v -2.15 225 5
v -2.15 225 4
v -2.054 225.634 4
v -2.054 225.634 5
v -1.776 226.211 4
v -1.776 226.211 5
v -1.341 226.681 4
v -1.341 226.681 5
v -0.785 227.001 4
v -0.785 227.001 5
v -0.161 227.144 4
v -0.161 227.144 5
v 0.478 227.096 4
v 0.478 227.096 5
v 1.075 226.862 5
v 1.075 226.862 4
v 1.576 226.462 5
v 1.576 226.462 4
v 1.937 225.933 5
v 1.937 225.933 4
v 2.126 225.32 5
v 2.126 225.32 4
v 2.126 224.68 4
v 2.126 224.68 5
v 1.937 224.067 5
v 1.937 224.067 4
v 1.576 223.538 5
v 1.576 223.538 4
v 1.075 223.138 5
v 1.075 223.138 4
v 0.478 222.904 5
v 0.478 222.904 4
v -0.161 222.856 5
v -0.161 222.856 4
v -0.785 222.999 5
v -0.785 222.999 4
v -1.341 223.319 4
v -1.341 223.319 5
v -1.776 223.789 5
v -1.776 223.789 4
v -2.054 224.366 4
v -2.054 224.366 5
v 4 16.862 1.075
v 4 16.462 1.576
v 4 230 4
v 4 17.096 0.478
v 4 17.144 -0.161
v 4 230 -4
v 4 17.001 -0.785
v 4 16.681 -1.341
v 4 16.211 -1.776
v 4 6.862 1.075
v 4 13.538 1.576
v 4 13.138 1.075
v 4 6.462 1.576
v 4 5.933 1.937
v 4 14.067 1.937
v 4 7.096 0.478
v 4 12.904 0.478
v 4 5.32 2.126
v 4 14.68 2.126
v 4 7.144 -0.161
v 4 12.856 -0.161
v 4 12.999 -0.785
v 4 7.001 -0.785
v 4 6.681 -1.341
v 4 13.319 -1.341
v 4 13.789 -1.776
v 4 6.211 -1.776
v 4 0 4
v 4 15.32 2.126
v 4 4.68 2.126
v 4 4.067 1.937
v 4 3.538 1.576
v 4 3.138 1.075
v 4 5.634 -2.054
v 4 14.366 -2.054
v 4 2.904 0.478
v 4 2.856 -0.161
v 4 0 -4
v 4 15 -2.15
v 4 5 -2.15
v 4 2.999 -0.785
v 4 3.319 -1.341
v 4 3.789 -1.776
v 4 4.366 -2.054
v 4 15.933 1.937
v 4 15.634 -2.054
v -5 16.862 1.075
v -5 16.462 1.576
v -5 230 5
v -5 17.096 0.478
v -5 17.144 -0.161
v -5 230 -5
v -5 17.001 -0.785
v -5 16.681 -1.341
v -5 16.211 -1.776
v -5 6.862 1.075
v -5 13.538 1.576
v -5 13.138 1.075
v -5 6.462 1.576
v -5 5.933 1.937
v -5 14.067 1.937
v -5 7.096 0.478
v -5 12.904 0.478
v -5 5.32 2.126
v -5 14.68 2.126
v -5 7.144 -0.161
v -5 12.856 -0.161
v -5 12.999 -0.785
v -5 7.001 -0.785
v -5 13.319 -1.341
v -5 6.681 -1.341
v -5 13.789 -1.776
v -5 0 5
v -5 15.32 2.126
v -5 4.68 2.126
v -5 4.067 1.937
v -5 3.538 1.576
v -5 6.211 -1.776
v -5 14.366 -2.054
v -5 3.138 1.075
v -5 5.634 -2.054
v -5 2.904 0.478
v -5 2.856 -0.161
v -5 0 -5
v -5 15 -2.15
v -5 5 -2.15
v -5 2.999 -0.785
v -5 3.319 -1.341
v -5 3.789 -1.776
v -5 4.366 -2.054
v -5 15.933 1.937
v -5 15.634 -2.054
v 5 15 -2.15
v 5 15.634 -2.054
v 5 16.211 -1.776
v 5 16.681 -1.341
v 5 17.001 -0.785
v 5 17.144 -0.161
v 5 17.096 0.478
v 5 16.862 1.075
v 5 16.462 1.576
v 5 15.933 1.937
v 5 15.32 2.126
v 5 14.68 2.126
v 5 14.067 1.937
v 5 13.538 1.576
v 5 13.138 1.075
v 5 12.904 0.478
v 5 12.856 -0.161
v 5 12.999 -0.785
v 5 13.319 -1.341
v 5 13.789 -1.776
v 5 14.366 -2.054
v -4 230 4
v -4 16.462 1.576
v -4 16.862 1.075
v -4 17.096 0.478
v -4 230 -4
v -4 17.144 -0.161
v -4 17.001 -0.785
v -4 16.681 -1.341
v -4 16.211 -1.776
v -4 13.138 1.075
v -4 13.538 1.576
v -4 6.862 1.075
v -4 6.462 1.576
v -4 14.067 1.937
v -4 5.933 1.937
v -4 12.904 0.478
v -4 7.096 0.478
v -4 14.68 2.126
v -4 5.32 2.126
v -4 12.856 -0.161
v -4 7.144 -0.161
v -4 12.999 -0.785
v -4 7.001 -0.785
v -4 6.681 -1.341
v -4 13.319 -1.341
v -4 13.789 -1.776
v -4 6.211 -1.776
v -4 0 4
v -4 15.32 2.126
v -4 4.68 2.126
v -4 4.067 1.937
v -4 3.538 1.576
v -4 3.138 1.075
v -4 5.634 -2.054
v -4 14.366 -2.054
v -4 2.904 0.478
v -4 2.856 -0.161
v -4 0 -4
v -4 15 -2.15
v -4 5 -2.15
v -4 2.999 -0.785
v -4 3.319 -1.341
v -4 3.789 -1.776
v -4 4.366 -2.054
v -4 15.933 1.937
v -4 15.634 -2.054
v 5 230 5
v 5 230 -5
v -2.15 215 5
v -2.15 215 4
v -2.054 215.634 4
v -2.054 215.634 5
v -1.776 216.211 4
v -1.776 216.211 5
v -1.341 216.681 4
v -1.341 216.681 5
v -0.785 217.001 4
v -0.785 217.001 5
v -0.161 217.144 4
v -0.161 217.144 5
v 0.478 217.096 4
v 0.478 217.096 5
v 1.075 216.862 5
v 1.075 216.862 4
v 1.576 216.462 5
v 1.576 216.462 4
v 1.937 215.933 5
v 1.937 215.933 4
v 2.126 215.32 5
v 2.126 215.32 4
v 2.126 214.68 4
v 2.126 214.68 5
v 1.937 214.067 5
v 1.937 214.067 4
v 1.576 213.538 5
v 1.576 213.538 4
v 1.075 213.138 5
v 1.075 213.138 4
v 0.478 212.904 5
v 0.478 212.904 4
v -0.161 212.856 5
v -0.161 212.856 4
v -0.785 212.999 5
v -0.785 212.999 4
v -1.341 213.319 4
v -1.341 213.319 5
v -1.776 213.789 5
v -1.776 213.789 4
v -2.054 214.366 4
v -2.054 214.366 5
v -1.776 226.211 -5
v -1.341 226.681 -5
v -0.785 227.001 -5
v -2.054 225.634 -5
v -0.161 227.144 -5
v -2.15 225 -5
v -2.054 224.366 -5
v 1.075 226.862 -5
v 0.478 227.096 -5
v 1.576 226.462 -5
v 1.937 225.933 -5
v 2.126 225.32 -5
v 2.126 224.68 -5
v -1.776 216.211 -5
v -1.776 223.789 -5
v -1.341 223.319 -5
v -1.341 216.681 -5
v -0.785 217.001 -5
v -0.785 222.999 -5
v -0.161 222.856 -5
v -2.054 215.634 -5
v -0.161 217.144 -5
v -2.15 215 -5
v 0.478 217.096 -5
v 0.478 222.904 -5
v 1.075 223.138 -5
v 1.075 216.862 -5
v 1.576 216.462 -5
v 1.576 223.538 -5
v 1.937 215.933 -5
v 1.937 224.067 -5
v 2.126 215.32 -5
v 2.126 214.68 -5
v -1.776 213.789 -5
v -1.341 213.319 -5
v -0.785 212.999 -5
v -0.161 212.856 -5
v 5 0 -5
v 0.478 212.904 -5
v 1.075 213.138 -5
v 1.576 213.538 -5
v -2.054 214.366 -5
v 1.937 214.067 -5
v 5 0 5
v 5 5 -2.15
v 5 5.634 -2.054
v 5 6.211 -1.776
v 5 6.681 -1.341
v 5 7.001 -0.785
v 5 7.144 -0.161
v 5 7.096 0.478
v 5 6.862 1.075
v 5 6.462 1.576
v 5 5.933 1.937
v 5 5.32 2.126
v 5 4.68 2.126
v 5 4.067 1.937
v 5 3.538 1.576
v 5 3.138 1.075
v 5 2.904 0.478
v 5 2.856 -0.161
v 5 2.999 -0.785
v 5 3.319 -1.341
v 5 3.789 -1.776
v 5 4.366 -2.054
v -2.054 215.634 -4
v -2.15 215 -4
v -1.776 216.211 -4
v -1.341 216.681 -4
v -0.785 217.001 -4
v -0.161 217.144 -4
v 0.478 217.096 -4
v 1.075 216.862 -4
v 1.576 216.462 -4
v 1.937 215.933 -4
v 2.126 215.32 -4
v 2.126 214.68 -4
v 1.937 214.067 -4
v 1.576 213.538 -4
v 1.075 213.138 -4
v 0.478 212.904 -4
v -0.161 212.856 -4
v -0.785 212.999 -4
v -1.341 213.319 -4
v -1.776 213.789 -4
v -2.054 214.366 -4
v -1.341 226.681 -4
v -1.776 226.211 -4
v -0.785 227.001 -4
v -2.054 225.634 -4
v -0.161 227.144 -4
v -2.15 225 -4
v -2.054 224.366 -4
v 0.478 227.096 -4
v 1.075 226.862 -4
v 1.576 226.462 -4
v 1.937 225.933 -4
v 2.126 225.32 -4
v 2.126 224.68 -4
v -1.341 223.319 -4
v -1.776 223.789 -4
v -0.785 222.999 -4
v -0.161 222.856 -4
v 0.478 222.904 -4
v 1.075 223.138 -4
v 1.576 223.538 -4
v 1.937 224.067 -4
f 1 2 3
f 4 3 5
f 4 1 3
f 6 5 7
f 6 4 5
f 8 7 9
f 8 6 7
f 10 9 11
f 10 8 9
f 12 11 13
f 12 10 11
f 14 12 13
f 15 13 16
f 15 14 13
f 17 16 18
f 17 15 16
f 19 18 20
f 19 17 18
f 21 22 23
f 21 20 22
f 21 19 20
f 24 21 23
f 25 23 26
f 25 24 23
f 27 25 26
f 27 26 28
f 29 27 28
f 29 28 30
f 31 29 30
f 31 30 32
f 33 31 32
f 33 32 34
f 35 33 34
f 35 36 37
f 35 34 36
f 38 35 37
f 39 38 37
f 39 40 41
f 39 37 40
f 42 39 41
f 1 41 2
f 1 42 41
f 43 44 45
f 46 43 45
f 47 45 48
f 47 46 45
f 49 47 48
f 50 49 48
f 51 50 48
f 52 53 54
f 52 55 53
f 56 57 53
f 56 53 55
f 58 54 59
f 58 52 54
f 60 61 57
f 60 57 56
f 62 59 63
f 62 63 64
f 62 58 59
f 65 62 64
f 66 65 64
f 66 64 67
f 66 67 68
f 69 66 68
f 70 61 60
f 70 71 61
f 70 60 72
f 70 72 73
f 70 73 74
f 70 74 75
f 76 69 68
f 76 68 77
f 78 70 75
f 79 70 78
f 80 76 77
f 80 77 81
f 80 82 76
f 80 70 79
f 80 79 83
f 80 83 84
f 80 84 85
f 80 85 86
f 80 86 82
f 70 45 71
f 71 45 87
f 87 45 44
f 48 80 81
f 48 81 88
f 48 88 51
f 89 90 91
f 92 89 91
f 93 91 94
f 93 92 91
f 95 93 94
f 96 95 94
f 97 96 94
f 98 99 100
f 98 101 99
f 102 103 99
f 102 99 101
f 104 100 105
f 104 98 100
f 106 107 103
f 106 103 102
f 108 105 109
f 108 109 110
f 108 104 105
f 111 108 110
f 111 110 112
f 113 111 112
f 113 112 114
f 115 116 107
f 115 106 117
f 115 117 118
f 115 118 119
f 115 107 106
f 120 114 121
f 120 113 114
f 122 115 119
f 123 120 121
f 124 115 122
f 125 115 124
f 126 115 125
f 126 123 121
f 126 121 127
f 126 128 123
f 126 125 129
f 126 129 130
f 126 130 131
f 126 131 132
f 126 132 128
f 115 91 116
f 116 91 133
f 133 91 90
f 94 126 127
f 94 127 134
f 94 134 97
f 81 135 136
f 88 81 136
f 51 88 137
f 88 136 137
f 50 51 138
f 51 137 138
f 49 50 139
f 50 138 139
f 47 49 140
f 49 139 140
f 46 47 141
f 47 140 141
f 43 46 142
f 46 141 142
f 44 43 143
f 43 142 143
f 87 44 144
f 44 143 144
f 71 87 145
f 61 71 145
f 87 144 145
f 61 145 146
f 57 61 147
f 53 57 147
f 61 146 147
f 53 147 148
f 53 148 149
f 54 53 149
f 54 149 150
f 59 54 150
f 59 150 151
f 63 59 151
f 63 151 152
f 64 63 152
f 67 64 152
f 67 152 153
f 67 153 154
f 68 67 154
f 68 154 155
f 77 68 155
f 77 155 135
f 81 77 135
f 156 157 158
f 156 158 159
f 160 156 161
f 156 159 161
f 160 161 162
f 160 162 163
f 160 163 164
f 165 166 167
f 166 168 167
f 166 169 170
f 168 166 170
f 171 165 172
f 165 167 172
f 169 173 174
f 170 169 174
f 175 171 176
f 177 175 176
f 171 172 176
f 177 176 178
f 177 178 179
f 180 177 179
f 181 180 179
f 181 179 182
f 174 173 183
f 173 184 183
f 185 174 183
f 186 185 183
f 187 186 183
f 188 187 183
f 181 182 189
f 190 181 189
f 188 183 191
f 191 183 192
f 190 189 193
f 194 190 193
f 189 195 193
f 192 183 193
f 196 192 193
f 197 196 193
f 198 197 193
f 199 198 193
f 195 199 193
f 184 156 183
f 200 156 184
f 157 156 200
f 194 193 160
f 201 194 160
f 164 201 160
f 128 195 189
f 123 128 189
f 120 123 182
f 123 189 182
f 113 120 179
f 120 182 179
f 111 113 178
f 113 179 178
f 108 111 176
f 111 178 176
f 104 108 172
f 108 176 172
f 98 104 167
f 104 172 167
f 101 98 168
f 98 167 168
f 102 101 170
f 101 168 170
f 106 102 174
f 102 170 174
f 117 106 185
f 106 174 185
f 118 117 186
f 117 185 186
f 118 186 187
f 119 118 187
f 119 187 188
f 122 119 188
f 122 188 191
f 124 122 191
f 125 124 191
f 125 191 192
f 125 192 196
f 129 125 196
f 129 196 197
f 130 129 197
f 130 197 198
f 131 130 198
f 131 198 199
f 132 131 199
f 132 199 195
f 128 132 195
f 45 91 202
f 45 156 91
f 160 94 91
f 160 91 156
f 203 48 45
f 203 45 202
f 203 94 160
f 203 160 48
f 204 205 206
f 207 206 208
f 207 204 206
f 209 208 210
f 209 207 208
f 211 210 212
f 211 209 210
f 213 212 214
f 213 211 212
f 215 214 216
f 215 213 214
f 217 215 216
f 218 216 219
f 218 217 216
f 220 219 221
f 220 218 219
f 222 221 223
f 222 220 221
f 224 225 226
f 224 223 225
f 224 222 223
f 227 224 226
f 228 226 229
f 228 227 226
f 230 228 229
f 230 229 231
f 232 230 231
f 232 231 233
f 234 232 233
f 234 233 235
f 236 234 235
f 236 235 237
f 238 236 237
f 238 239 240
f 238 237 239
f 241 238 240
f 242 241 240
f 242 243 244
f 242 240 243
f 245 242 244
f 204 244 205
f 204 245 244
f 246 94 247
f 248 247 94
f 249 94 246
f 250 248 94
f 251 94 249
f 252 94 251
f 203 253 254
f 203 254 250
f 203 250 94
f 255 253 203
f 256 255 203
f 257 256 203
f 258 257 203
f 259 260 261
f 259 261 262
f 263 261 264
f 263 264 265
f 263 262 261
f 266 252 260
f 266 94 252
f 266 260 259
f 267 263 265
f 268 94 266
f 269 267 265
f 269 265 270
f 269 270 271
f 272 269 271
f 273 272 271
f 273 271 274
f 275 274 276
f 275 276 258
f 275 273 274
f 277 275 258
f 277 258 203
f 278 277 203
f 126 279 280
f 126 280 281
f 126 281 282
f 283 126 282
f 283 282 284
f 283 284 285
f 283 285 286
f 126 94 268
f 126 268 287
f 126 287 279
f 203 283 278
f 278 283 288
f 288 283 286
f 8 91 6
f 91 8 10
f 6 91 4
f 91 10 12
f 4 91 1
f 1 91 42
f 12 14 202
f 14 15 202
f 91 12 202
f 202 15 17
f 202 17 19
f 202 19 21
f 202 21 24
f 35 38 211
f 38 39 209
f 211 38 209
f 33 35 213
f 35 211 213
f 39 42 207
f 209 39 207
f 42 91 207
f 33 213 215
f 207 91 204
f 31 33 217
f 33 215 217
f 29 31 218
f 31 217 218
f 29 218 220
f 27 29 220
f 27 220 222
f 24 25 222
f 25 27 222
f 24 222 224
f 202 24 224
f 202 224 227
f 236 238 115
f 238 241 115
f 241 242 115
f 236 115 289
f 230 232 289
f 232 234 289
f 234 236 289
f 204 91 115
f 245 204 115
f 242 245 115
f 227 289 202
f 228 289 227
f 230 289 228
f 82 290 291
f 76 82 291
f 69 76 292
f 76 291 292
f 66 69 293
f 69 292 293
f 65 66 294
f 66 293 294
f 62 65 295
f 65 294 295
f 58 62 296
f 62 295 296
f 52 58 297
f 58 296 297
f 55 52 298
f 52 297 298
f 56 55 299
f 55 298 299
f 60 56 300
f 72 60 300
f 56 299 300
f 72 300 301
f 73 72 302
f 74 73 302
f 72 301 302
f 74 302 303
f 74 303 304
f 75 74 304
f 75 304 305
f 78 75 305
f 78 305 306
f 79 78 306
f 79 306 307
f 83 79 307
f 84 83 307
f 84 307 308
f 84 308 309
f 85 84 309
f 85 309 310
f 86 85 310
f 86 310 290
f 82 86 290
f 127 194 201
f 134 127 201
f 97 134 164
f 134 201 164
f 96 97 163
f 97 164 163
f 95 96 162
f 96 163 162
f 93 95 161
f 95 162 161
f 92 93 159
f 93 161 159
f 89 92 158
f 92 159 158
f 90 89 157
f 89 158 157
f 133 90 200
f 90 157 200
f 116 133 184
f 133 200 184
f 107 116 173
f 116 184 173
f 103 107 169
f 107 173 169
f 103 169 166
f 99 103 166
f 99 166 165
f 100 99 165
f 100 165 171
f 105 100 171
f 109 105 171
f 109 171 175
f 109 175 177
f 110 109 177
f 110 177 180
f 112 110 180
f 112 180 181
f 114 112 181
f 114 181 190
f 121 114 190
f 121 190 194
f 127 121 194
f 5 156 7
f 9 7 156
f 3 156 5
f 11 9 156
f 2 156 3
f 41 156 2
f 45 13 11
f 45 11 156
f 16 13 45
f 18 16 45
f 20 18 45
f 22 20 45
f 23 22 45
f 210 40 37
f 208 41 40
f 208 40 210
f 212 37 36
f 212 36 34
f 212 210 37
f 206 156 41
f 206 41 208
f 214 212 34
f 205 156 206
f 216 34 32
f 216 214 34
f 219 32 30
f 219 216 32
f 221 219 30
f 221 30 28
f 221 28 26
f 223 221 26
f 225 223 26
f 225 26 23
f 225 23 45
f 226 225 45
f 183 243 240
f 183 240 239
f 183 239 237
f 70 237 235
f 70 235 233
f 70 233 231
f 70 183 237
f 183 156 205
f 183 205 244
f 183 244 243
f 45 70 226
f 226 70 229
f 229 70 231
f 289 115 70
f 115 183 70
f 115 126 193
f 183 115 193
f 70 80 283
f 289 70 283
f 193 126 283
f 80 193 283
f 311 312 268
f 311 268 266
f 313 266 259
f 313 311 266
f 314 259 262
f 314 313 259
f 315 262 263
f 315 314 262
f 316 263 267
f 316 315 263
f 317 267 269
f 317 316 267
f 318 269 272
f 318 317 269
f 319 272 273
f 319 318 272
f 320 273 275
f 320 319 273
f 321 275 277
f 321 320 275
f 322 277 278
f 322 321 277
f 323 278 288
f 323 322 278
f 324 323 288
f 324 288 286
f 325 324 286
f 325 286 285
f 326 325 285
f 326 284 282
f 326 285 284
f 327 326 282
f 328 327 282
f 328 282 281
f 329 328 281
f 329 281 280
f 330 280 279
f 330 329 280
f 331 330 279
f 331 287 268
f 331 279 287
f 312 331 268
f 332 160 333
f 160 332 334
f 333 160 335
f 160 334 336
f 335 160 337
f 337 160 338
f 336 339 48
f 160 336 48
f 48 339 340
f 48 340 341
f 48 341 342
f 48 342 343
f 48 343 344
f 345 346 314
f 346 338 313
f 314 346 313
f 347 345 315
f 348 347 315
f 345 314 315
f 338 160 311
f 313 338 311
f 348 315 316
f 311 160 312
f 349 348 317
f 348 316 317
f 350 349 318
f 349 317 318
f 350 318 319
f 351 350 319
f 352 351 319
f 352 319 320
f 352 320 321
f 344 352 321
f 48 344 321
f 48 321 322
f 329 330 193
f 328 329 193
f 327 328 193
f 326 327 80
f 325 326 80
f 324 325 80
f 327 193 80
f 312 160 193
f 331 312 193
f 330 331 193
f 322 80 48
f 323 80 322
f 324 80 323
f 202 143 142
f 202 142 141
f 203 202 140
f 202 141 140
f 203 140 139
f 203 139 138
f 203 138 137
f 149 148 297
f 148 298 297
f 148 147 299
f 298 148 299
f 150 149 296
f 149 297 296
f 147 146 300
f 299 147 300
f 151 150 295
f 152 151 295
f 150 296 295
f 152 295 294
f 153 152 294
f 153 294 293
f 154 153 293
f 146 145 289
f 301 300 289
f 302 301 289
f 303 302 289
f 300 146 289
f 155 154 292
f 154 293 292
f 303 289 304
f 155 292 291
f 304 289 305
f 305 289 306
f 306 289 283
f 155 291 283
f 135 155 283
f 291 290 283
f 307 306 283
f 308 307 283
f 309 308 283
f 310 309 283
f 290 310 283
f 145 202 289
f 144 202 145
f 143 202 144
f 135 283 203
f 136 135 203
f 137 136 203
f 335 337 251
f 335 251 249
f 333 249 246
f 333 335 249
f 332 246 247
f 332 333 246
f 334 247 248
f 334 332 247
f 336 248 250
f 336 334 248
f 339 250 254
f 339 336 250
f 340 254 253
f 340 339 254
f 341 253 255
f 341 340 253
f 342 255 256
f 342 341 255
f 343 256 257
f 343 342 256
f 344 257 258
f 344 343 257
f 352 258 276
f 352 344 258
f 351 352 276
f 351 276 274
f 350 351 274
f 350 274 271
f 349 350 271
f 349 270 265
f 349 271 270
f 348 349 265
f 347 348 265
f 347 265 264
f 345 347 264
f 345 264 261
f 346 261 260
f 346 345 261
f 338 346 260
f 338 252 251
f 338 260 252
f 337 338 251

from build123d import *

# Parameters (mm, degrees)
SKETCH_1_W          = 10
SKETCH_1_H          = 10
SKETCH_1_W_2        = 8
SKETCH_1_H_2        = 8
EXTRUDE_1_DEPTH     = 230
SKETCH_2_R          = 2.15
CUT_EXTRUDE_1_DEPTH = 231.271578793
SKETCH_3_R          = 2.15
CUT_EXTRUDE_2_DEPTH = 231.271578793


with BuildPart() as part:
    # ｽｹｯﾁ1 → 押し出し-薄板1 (new body)
    with BuildSketch(Plane(origin=(0, 0, 0), x_dir=(1, 0, 0), z_dir=(0, 1, 0))):
        Rectangle(SKETCH_1_W, SKETCH_1_H)
        Rectangle(SKETCH_1_W_2, SKETCH_1_H_2, mode=Mode.SUBTRACT)
    extrude(amount=EXTRUDE_1_DEPTH)

    # ｽｹｯﾁ2 → ｶｯﾄ - 押し出し1 (cut, through all)
    with BuildSketch(Plane(origin=(0, 0, 5), x_dir=(-1, 0, 0), z_dir=(0, 0, -1))):
        with Locations((0, 215)):
            Circle(SKETCH_2_R)
        with Locations((0, 225)):
            Circle(SKETCH_2_R)
    extrude(amount=CUT_EXTRUDE_1_DEPTH, mode=Mode.SUBTRACT)

    # ｽｹｯﾁ3 → ｶｯﾄ - 押し出し2 (cut, through all)
    with BuildSketch(Plane(origin=(5, 0, 0), x_dir=(0, 0, -1), z_dir=(1, 0, 0))):
        with Locations((0, 15)):
            Circle(SKETCH_3_R)
        with Locations((0, 5)):
            Circle(SKETCH_3_R)
    extrude(amount=-CUT_EXTRUDE_2_DEPTH, mode=Mode.SUBTRACT)


solid = part.part
